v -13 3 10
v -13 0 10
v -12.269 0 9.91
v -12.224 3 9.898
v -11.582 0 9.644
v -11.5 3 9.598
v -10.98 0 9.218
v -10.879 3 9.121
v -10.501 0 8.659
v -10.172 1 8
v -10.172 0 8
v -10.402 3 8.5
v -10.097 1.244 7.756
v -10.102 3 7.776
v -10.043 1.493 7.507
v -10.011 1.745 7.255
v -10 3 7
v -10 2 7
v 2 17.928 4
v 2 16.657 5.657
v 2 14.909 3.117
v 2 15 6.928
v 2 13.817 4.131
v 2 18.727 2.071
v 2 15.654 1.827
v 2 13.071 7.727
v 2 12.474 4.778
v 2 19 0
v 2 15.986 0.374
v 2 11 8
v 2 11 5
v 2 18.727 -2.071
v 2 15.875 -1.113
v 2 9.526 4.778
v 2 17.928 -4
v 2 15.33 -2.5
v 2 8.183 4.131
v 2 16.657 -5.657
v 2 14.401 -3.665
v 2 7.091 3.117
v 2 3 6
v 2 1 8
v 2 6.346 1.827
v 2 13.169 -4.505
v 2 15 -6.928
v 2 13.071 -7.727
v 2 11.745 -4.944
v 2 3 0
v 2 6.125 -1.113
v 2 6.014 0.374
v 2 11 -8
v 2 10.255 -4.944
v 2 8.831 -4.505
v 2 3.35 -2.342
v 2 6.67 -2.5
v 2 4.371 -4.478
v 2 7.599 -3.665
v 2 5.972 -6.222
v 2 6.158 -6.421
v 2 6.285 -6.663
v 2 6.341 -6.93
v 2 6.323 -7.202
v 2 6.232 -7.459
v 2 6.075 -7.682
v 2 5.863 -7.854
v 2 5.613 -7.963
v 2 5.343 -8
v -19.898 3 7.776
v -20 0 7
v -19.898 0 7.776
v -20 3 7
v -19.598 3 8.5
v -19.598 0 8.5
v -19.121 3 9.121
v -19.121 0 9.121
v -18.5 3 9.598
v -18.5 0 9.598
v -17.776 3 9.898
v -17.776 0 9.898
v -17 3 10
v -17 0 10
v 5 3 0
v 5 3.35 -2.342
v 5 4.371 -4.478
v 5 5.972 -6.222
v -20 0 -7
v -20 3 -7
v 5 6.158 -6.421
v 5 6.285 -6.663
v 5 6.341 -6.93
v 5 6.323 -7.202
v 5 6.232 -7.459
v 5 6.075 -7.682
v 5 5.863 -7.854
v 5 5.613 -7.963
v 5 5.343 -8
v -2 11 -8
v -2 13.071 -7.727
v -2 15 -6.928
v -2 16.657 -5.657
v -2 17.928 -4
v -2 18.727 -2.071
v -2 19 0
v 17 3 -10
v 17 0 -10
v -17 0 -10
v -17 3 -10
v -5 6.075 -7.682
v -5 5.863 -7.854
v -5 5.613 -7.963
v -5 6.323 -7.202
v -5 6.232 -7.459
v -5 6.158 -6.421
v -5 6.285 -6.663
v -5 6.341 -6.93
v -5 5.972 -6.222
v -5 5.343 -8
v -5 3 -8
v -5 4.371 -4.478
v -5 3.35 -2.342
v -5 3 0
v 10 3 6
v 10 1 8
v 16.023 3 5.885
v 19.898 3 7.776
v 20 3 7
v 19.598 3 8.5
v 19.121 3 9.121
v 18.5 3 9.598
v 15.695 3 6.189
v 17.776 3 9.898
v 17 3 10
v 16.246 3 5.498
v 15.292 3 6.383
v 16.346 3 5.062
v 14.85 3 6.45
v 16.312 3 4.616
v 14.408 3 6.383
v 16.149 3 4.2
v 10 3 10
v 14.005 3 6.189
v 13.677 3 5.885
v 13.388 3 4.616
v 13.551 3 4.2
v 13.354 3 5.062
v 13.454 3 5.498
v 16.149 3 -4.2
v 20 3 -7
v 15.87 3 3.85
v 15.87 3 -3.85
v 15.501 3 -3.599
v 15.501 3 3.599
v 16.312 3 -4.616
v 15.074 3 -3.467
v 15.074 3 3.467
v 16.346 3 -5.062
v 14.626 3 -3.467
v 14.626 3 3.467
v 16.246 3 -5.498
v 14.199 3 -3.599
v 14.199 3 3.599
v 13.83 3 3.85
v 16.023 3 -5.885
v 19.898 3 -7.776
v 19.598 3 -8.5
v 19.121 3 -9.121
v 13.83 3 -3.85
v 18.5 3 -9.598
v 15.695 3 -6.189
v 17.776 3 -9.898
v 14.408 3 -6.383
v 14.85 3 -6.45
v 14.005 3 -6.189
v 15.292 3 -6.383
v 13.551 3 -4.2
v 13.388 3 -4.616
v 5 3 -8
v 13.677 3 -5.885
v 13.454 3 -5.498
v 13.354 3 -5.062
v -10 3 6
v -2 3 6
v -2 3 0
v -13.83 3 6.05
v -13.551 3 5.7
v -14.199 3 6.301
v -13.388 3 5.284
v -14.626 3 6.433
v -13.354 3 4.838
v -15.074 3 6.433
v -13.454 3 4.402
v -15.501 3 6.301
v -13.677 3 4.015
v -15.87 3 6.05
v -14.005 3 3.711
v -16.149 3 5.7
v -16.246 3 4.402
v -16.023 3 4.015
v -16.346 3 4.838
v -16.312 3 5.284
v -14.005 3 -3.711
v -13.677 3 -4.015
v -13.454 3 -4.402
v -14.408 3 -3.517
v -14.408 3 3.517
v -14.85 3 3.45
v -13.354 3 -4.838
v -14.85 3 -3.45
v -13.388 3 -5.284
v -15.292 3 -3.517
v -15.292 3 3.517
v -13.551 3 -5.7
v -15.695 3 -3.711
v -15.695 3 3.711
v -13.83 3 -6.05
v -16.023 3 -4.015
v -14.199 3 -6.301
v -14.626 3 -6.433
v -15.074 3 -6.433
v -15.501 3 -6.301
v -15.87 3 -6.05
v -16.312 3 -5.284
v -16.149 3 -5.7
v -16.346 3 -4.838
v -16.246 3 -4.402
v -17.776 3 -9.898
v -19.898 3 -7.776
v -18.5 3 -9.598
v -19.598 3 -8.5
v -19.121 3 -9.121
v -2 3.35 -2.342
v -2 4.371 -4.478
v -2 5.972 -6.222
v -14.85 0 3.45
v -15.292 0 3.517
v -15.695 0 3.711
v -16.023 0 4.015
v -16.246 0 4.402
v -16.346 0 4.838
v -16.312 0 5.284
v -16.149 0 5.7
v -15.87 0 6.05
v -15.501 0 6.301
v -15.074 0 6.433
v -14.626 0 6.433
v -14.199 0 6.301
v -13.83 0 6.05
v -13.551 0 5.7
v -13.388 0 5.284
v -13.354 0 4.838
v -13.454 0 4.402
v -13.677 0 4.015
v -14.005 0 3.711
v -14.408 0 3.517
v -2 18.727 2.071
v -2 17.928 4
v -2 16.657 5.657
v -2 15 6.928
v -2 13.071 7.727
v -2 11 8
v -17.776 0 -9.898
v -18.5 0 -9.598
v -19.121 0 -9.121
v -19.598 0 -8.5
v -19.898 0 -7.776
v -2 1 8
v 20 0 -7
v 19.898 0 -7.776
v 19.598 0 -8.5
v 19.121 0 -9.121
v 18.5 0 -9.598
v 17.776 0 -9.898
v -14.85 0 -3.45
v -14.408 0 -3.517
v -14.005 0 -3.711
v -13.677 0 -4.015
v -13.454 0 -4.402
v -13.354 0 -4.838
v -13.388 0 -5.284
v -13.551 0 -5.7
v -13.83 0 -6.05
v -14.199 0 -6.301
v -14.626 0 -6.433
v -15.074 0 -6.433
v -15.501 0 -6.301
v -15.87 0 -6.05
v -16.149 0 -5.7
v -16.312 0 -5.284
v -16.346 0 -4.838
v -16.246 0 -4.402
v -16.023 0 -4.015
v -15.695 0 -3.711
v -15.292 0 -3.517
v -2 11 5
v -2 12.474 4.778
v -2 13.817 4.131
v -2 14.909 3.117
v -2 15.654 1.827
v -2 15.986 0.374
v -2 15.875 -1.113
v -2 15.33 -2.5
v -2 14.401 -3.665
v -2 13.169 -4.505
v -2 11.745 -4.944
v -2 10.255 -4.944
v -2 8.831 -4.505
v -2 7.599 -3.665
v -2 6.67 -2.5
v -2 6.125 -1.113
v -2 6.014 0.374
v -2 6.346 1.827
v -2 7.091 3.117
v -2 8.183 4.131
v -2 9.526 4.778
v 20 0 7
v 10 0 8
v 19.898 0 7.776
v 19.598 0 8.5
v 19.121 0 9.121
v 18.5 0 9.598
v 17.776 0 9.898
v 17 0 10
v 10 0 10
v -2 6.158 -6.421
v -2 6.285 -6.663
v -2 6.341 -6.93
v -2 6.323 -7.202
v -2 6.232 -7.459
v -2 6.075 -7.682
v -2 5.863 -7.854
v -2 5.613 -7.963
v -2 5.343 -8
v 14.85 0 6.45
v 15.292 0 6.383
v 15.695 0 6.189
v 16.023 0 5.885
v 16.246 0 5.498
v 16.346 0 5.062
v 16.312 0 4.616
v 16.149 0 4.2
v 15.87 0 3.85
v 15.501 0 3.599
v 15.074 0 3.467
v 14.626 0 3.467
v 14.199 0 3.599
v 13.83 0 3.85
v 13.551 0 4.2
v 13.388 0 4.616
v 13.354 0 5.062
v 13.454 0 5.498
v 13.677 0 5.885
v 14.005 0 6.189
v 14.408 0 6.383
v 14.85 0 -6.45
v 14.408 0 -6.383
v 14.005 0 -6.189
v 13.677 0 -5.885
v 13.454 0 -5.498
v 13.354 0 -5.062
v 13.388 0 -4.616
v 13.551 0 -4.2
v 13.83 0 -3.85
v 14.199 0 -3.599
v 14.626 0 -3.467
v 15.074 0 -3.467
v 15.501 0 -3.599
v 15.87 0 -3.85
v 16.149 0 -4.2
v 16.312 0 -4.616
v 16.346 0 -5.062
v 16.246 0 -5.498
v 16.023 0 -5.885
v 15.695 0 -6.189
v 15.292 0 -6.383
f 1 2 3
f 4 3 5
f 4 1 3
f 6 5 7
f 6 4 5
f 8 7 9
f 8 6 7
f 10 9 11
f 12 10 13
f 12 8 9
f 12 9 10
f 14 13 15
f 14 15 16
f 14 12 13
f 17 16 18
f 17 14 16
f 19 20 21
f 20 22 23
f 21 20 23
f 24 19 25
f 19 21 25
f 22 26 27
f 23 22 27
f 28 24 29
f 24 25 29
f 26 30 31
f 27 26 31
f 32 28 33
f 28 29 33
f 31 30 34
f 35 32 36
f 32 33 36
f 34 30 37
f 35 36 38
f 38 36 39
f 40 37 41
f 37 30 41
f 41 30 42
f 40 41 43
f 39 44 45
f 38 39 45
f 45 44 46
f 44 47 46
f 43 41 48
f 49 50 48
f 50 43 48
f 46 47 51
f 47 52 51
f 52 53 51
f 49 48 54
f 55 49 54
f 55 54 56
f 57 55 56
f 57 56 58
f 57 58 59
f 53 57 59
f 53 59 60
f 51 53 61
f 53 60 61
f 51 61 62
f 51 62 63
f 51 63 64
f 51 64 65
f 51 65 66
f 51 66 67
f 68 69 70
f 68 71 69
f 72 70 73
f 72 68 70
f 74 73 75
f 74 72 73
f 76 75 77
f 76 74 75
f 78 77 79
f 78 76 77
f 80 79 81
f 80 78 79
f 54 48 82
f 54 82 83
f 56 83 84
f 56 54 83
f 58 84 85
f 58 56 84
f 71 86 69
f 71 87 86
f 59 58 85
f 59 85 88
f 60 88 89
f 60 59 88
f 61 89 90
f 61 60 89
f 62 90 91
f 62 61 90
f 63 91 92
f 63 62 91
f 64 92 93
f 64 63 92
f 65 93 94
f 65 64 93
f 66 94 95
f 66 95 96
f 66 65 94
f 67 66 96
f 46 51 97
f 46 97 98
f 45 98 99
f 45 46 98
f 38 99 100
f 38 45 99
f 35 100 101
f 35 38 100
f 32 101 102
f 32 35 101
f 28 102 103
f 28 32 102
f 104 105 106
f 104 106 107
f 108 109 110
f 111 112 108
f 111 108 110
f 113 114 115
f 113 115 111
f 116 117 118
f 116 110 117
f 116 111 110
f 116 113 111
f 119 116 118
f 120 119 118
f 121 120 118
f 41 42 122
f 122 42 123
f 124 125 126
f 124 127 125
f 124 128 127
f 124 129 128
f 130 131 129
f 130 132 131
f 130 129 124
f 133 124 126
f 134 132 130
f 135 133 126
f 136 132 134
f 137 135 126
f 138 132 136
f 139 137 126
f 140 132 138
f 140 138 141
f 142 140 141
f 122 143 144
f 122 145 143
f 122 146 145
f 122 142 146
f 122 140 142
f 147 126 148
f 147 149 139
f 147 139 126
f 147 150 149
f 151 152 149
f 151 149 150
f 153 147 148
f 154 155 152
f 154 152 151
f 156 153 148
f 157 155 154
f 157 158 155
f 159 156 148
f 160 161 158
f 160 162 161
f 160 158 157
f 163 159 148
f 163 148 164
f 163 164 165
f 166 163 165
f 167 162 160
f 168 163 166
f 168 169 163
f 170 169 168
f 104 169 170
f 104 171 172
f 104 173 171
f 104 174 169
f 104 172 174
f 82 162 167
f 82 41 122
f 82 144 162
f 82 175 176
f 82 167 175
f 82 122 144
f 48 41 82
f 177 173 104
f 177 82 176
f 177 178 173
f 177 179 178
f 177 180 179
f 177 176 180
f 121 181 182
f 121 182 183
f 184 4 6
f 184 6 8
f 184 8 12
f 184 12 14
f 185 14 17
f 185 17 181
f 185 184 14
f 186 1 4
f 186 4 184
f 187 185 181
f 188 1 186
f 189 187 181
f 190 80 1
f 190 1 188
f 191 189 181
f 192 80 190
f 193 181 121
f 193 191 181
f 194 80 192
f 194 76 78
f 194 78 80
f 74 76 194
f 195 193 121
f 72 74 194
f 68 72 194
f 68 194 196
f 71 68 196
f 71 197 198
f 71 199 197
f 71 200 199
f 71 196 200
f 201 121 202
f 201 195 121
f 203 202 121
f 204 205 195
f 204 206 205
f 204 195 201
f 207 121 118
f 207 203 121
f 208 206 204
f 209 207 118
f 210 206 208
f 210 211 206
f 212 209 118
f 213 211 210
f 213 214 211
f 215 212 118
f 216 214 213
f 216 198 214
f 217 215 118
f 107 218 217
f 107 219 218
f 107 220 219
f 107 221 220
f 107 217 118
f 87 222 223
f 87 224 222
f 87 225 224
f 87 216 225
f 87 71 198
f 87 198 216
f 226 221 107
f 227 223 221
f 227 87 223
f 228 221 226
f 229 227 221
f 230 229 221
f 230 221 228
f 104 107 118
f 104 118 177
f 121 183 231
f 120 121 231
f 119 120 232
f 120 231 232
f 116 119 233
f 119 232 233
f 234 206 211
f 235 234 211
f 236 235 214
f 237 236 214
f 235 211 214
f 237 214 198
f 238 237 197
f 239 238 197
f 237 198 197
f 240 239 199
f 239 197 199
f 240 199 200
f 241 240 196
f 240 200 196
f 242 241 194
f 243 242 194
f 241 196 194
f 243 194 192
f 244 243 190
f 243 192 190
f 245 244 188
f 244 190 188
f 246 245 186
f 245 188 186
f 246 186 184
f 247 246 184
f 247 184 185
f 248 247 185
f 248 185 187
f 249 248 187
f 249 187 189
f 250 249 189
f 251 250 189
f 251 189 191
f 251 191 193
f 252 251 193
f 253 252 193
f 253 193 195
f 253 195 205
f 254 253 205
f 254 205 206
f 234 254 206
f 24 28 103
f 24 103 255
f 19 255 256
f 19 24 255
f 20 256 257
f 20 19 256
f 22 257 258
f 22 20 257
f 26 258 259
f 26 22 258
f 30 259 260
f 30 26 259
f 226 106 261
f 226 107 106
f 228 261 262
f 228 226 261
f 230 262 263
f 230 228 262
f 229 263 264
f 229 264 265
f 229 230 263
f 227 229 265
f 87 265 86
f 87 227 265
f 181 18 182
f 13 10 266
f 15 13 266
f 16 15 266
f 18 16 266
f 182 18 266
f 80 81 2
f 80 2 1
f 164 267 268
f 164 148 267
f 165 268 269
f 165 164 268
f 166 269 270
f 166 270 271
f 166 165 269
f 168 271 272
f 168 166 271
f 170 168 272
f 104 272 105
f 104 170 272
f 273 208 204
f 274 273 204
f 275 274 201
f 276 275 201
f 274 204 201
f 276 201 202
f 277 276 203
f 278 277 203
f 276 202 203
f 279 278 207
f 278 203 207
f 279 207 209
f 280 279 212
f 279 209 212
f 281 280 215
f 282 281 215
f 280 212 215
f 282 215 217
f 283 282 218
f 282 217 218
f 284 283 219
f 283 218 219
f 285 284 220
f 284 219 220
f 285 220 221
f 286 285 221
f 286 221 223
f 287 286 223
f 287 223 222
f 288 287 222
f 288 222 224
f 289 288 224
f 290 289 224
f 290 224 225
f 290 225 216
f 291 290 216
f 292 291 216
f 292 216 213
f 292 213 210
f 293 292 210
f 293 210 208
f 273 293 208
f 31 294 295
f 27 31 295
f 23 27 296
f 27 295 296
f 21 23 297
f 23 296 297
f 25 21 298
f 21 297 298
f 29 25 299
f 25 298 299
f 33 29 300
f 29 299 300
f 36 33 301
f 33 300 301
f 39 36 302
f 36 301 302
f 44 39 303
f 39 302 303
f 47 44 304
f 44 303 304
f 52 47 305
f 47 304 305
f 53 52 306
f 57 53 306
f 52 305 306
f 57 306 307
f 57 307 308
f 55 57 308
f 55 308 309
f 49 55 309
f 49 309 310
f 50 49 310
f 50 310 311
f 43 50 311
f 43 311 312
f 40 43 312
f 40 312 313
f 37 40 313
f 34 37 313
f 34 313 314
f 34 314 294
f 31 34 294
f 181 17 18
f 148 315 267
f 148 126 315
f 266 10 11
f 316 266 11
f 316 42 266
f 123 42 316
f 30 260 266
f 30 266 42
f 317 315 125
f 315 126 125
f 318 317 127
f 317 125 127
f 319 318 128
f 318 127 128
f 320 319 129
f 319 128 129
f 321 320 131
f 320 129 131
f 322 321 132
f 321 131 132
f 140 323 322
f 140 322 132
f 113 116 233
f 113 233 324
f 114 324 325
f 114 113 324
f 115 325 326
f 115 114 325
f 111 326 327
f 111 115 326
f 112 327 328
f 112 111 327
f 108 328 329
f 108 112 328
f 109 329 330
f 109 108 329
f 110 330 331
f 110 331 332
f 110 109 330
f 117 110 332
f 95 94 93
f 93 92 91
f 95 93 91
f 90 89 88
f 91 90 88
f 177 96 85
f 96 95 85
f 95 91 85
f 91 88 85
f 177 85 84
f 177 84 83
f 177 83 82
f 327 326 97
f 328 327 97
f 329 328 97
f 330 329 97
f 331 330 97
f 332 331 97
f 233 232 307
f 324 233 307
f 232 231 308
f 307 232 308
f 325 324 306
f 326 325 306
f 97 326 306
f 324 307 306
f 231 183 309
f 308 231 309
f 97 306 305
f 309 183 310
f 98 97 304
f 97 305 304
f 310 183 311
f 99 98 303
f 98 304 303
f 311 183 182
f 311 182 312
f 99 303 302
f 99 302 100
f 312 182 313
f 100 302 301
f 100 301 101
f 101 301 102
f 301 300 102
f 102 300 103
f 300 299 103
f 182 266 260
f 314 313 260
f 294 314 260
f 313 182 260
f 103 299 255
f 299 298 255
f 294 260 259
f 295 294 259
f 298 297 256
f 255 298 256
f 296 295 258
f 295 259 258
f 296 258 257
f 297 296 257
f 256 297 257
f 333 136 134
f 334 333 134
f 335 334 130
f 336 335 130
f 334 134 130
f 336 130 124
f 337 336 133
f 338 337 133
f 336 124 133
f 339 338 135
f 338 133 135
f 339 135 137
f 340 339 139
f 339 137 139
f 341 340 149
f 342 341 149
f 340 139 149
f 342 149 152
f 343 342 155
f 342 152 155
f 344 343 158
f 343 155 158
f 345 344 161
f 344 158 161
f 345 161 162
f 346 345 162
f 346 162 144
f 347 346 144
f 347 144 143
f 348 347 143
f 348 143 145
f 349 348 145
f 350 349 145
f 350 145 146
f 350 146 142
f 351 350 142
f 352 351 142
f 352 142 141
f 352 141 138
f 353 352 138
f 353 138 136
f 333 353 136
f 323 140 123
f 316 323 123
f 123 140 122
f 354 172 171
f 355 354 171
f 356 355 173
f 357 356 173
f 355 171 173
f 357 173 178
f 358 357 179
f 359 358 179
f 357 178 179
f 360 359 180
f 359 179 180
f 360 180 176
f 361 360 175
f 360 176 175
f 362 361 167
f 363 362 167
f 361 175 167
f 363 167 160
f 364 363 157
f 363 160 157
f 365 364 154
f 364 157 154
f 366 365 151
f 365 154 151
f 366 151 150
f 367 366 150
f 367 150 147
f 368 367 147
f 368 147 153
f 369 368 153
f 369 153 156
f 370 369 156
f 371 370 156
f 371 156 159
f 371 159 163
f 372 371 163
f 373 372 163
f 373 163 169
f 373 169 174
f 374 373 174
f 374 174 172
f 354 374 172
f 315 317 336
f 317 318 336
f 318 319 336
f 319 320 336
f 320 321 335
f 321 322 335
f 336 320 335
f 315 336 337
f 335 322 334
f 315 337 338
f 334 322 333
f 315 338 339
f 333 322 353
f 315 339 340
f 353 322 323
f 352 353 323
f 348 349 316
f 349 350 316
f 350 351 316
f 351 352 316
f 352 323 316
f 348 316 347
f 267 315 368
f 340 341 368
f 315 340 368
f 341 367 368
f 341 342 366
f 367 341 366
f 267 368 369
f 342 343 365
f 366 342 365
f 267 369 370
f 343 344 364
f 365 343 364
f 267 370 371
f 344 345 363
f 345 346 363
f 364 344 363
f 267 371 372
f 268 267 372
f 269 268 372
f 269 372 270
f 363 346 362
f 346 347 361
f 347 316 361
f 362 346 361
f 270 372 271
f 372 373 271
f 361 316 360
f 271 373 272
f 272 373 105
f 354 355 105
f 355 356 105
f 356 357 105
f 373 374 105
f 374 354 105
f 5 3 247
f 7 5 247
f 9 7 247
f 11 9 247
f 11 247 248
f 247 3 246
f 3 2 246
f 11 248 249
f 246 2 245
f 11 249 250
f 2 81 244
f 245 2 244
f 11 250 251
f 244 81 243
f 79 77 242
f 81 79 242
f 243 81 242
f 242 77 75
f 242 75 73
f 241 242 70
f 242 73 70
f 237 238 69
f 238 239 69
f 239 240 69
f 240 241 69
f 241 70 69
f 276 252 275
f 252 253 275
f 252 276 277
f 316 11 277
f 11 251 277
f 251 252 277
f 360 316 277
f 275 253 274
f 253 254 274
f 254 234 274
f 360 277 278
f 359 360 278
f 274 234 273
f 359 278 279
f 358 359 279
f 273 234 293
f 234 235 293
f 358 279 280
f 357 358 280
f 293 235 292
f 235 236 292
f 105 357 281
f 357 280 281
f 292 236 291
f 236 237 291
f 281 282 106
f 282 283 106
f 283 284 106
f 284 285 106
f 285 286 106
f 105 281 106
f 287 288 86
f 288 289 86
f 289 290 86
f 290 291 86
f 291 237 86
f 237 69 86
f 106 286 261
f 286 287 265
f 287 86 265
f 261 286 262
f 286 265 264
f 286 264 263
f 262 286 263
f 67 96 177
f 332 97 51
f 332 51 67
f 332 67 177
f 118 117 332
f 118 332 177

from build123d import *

# Parameters (mm, degrees)
SKETCH1_W               = 36
SKETCH1_H               = 16
BOSS_EXTRUDE1_DEPTH     = 3
SKETCH3_W               = 4
SKETCH3_H               = 16
BOSS_EXTRUDE2_DEPTH     = 16
BOSS_EXTRUDE3_DEPTH     = 3
CUT_EXTRUDE2_DEPTH      = 29.722813233
CUT_EXTRUDE2_DEPTH_BACK = 29.722813233
FILLET1_START           = -5
FILLET1_DEPTH           = 3
FILLET1_START_2         = 2
FILLET1_2_DEPTH         = 3
SKETCH7_R               = 5
CUT_EXTRUDE3_DEPTH      = 6
SKETCH8_R               = 1.5
CUT_EXTRUDE5_DEPTH      = 6
SKETCH12_W              = 36
SKETCH12_H              = 3
BOSS_EXTRUDE4_DEPTH     = 2
SKETCH13_W              = 36
SKETCH13_H              = 3
BOSS_EXTRUDE5_DEPTH     = 2
SKETCH14_W              = 20
SKETCH14_H              = 3
BOSS_EXTRUDE6_DEPTH     = 2
SKETCH15_W              = 20
SKETCH15_H              = 3
BOSS_EXTRUDE7_DEPTH     = 2
SKETCH16_W              = 20
SKETCH16_H              = 4
CUT_EXTRUDE6_DEPTH      = 6
CHAMFER1_SIZE           = 2
FILLET3_R               = 3


with BuildPart() as part:
    # Sketch1 → Boss-Extrude1 (new body)
    with BuildSketch(Plane(origin=(0, 0, 0), x_dir=(1, 0, 0), z_dir=(0, 1, 0))):
        Rectangle(SKETCH1_W, SKETCH1_H)
    extrude(amount=BOSS_EXTRUDE1_DEPTH)

    # Sketch3 → Boss-Extrude2 (add)
    with BuildSketch(Plane(origin=(0, 3, 0), x_dir=(1, 0, 0), z_dir=(0, 1, 0))):
        Rectangle(SKETCH3_W, SKETCH3_H)
    extrude(amount=BOSS_EXTRUDE2_DEPTH)

    # Sketch4 → Boss-Extrude3 (add)
    with BuildSketch(Plane.ZY.offset(2)):
        with BuildLine():
            Line((-8, 3), (1.5e-08, 3))
            ThreePointArc((1.5e-08, 3), (-5.656854244, 5.343145745), (-8, 11))
            Line((-8, 11), (-8, 3))
        make_face()
    boss_extrude3 = extrude(amount=BOSS_EXTRUDE3_DEPTH)

    # Mirror1: Boss-Extrude3 across plane
    add(boss_extrude3.mirror(Plane(origin=(0, 0, 0), x_dir=(0, 0, 1), z_dir=(1, 0, 0))))

    # Sketch6 → Cut-Extrude2 (cut, two sides: drawn at the far end of the back side and taken through both)
    with BuildSketch(Plane.ZY.offset(2).offset(-CUT_EXTRUDE2_DEPTH_BACK)):
        with BuildLine():
            Line((-8, 19), (-8, 11))
            ThreePointArc((-8, 11), (-5.656854249, 16.656854249), (0, 19))
            Line((0, 19), (-8, 19))
        make_face()
        with BuildLine():
            ThreePointArc((0, 19), (5.656854249, 16.656854249), (8, 11))
            Line((8, 11), (8, 19))
            Line((8, 19), (0, 19))
        make_face()
    extrude(amount=CUT_EXTRUDE2_DEPTH + CUT_EXTRUDE2_DEPTH_BACK, mode=Mode.SUBTRACT)

    # Fillet1: read off the stored shape, not the designer's step
    # Fillet1 outline → Fillet1 (cut)
    with BuildSketch(Plane.YZ.offset(FILLET1_START)):
        with BuildLine():
            ThreePointArc((11, -8), (8.333333334, -7.542472332), (5.971685112, -6.222222222))
            ThreePointArc((5.971685112, -6.222222222), (6.285954792, -7.333333333), (5.343145751, -8))
            Line((5.343145751, -8), (11, -8))
        make_face()
    extrude(amount=FILLET1_DEPTH, mode=Mode.SUBTRACT)

    # Fillet1 2 outline → Fillet1 2 (cut)
    with BuildSketch(Plane.YZ.offset(FILLET1_START_2)):
        with BuildLine():
            ThreePointArc((11, -8), (8.333333334, -7.542472332), (5.971685112, -6.222222222))
            ThreePointArc((5.971685112, -6.222222222), (6.285954792, -7.333333333), (5.343145751, -8))
            Line((5.343145751, -8), (11, -8))
        make_face()
    extrude(amount=FILLET1_2_DEPTH, mode=Mode.SUBTRACT)

    # Sketch7 → Cut-Extrude3 (cut)
    with BuildSketch(Plane.ZY.offset(2)):
        with Locations((0, 11)):
            Circle(SKETCH7_R)
    extrude(amount=-CUT_EXTRUDE3_DEPTH, mode=Mode.SUBTRACT)

    # Sketch8 → Cut-Extrude5 (cut)
    with BuildSketch(Plane(origin=(0, 3, 0), x_dir=(1, 0, 0), z_dir=(0, 1, 0))):
        with Locations(Location((-14.85, 4.95, 0), (0, 0, 270))):
            Circle(SKETCH8_R)
        with Locations(Location((14.85, 4.95, 0), (0, 0, 90))):
            Circle(SKETCH8_R)
        with Locations(Location((14.85, -4.95, 0), (0, 0, 270))):
            Circle(SKETCH8_R)
        with Locations(Location((-14.85, -4.95, 0), (0, 0, 90))):
            Circle(SKETCH8_R)
    extrude(amount=-CUT_EXTRUDE5_DEPTH, mode=Mode.SUBTRACT)

    # Sketch12 → Boss-Extrude4 (add)
    with BuildSketch(Plane.XY.offset(8)):
        with Locations((0, 1.5)):
            Rectangle(SKETCH12_W, SKETCH12_H)
    extrude(amount=BOSS_EXTRUDE4_DEPTH)

    # Sketch13 → Boss-Extrude5 (add)
    with BuildSketch(Plane(origin=(0, 0, -8), x_dir=(-1, 0, 0), z_dir=(0, 0, -1))):
        with Locations((0, 1.5)):
            Rectangle(SKETCH13_W, SKETCH13_H)
    extrude(amount=BOSS_EXTRUDE5_DEPTH)

    # Sketch14 → Boss-Extrude6 (add)
    with BuildSketch(Plane.ZY.offset(18)):
        with Locations((0, 1.5)):
            Rectangle(SKETCH14_W, SKETCH14_H)
    extrude(amount=BOSS_EXTRUDE6_DEPTH)

    # Sketch15 → Boss-Extrude7 (add)
    with BuildSketch(Plane(origin=(18, 0, 0), x_dir=(0, 0, -1), z_dir=(1, 0, 0))):
        with Locations((0, 1.5)):
            Rectangle(SKETCH15_W, SKETCH15_H)
    extrude(amount=BOSS_EXTRUDE7_DEPTH)

    # Sketch16 → Cut-Extrude6 (cut)
    with BuildSketch(Plane(origin=(0, 3, 0), x_dir=(1, 0, 0), z_dir=(0, 1, 0))):
        with Locations((0, -10)):
            Rectangle(SKETCH16_W, SKETCH16_H)
    extrude(amount=-CUT_EXTRUDE6_DEPTH, mode=Mode.SUBTRACT)

    # Chamfer1
    chamfer1_edges = [part.edges().sort_by_distance(p)[0] for p in [
        (6, 3, 8),
        (-6, 3, 8),
    ]]
    chamfer(chamfer1_edges, length=CHAMFER1_SIZE)

    # Fillet3
    fillet3_edges = [part.edges().sort_by_distance(p)[0] for p in [
        (-20, 1.5, -10),
        (-20, 1.5, 10),
        (20, 1.5, 10),
        (20, 1.5, -10),
        (-10, 1.5, 10),
    ]]
    fillet(fillet3_edges, radius=FILLET3_R)


solid = part.part
